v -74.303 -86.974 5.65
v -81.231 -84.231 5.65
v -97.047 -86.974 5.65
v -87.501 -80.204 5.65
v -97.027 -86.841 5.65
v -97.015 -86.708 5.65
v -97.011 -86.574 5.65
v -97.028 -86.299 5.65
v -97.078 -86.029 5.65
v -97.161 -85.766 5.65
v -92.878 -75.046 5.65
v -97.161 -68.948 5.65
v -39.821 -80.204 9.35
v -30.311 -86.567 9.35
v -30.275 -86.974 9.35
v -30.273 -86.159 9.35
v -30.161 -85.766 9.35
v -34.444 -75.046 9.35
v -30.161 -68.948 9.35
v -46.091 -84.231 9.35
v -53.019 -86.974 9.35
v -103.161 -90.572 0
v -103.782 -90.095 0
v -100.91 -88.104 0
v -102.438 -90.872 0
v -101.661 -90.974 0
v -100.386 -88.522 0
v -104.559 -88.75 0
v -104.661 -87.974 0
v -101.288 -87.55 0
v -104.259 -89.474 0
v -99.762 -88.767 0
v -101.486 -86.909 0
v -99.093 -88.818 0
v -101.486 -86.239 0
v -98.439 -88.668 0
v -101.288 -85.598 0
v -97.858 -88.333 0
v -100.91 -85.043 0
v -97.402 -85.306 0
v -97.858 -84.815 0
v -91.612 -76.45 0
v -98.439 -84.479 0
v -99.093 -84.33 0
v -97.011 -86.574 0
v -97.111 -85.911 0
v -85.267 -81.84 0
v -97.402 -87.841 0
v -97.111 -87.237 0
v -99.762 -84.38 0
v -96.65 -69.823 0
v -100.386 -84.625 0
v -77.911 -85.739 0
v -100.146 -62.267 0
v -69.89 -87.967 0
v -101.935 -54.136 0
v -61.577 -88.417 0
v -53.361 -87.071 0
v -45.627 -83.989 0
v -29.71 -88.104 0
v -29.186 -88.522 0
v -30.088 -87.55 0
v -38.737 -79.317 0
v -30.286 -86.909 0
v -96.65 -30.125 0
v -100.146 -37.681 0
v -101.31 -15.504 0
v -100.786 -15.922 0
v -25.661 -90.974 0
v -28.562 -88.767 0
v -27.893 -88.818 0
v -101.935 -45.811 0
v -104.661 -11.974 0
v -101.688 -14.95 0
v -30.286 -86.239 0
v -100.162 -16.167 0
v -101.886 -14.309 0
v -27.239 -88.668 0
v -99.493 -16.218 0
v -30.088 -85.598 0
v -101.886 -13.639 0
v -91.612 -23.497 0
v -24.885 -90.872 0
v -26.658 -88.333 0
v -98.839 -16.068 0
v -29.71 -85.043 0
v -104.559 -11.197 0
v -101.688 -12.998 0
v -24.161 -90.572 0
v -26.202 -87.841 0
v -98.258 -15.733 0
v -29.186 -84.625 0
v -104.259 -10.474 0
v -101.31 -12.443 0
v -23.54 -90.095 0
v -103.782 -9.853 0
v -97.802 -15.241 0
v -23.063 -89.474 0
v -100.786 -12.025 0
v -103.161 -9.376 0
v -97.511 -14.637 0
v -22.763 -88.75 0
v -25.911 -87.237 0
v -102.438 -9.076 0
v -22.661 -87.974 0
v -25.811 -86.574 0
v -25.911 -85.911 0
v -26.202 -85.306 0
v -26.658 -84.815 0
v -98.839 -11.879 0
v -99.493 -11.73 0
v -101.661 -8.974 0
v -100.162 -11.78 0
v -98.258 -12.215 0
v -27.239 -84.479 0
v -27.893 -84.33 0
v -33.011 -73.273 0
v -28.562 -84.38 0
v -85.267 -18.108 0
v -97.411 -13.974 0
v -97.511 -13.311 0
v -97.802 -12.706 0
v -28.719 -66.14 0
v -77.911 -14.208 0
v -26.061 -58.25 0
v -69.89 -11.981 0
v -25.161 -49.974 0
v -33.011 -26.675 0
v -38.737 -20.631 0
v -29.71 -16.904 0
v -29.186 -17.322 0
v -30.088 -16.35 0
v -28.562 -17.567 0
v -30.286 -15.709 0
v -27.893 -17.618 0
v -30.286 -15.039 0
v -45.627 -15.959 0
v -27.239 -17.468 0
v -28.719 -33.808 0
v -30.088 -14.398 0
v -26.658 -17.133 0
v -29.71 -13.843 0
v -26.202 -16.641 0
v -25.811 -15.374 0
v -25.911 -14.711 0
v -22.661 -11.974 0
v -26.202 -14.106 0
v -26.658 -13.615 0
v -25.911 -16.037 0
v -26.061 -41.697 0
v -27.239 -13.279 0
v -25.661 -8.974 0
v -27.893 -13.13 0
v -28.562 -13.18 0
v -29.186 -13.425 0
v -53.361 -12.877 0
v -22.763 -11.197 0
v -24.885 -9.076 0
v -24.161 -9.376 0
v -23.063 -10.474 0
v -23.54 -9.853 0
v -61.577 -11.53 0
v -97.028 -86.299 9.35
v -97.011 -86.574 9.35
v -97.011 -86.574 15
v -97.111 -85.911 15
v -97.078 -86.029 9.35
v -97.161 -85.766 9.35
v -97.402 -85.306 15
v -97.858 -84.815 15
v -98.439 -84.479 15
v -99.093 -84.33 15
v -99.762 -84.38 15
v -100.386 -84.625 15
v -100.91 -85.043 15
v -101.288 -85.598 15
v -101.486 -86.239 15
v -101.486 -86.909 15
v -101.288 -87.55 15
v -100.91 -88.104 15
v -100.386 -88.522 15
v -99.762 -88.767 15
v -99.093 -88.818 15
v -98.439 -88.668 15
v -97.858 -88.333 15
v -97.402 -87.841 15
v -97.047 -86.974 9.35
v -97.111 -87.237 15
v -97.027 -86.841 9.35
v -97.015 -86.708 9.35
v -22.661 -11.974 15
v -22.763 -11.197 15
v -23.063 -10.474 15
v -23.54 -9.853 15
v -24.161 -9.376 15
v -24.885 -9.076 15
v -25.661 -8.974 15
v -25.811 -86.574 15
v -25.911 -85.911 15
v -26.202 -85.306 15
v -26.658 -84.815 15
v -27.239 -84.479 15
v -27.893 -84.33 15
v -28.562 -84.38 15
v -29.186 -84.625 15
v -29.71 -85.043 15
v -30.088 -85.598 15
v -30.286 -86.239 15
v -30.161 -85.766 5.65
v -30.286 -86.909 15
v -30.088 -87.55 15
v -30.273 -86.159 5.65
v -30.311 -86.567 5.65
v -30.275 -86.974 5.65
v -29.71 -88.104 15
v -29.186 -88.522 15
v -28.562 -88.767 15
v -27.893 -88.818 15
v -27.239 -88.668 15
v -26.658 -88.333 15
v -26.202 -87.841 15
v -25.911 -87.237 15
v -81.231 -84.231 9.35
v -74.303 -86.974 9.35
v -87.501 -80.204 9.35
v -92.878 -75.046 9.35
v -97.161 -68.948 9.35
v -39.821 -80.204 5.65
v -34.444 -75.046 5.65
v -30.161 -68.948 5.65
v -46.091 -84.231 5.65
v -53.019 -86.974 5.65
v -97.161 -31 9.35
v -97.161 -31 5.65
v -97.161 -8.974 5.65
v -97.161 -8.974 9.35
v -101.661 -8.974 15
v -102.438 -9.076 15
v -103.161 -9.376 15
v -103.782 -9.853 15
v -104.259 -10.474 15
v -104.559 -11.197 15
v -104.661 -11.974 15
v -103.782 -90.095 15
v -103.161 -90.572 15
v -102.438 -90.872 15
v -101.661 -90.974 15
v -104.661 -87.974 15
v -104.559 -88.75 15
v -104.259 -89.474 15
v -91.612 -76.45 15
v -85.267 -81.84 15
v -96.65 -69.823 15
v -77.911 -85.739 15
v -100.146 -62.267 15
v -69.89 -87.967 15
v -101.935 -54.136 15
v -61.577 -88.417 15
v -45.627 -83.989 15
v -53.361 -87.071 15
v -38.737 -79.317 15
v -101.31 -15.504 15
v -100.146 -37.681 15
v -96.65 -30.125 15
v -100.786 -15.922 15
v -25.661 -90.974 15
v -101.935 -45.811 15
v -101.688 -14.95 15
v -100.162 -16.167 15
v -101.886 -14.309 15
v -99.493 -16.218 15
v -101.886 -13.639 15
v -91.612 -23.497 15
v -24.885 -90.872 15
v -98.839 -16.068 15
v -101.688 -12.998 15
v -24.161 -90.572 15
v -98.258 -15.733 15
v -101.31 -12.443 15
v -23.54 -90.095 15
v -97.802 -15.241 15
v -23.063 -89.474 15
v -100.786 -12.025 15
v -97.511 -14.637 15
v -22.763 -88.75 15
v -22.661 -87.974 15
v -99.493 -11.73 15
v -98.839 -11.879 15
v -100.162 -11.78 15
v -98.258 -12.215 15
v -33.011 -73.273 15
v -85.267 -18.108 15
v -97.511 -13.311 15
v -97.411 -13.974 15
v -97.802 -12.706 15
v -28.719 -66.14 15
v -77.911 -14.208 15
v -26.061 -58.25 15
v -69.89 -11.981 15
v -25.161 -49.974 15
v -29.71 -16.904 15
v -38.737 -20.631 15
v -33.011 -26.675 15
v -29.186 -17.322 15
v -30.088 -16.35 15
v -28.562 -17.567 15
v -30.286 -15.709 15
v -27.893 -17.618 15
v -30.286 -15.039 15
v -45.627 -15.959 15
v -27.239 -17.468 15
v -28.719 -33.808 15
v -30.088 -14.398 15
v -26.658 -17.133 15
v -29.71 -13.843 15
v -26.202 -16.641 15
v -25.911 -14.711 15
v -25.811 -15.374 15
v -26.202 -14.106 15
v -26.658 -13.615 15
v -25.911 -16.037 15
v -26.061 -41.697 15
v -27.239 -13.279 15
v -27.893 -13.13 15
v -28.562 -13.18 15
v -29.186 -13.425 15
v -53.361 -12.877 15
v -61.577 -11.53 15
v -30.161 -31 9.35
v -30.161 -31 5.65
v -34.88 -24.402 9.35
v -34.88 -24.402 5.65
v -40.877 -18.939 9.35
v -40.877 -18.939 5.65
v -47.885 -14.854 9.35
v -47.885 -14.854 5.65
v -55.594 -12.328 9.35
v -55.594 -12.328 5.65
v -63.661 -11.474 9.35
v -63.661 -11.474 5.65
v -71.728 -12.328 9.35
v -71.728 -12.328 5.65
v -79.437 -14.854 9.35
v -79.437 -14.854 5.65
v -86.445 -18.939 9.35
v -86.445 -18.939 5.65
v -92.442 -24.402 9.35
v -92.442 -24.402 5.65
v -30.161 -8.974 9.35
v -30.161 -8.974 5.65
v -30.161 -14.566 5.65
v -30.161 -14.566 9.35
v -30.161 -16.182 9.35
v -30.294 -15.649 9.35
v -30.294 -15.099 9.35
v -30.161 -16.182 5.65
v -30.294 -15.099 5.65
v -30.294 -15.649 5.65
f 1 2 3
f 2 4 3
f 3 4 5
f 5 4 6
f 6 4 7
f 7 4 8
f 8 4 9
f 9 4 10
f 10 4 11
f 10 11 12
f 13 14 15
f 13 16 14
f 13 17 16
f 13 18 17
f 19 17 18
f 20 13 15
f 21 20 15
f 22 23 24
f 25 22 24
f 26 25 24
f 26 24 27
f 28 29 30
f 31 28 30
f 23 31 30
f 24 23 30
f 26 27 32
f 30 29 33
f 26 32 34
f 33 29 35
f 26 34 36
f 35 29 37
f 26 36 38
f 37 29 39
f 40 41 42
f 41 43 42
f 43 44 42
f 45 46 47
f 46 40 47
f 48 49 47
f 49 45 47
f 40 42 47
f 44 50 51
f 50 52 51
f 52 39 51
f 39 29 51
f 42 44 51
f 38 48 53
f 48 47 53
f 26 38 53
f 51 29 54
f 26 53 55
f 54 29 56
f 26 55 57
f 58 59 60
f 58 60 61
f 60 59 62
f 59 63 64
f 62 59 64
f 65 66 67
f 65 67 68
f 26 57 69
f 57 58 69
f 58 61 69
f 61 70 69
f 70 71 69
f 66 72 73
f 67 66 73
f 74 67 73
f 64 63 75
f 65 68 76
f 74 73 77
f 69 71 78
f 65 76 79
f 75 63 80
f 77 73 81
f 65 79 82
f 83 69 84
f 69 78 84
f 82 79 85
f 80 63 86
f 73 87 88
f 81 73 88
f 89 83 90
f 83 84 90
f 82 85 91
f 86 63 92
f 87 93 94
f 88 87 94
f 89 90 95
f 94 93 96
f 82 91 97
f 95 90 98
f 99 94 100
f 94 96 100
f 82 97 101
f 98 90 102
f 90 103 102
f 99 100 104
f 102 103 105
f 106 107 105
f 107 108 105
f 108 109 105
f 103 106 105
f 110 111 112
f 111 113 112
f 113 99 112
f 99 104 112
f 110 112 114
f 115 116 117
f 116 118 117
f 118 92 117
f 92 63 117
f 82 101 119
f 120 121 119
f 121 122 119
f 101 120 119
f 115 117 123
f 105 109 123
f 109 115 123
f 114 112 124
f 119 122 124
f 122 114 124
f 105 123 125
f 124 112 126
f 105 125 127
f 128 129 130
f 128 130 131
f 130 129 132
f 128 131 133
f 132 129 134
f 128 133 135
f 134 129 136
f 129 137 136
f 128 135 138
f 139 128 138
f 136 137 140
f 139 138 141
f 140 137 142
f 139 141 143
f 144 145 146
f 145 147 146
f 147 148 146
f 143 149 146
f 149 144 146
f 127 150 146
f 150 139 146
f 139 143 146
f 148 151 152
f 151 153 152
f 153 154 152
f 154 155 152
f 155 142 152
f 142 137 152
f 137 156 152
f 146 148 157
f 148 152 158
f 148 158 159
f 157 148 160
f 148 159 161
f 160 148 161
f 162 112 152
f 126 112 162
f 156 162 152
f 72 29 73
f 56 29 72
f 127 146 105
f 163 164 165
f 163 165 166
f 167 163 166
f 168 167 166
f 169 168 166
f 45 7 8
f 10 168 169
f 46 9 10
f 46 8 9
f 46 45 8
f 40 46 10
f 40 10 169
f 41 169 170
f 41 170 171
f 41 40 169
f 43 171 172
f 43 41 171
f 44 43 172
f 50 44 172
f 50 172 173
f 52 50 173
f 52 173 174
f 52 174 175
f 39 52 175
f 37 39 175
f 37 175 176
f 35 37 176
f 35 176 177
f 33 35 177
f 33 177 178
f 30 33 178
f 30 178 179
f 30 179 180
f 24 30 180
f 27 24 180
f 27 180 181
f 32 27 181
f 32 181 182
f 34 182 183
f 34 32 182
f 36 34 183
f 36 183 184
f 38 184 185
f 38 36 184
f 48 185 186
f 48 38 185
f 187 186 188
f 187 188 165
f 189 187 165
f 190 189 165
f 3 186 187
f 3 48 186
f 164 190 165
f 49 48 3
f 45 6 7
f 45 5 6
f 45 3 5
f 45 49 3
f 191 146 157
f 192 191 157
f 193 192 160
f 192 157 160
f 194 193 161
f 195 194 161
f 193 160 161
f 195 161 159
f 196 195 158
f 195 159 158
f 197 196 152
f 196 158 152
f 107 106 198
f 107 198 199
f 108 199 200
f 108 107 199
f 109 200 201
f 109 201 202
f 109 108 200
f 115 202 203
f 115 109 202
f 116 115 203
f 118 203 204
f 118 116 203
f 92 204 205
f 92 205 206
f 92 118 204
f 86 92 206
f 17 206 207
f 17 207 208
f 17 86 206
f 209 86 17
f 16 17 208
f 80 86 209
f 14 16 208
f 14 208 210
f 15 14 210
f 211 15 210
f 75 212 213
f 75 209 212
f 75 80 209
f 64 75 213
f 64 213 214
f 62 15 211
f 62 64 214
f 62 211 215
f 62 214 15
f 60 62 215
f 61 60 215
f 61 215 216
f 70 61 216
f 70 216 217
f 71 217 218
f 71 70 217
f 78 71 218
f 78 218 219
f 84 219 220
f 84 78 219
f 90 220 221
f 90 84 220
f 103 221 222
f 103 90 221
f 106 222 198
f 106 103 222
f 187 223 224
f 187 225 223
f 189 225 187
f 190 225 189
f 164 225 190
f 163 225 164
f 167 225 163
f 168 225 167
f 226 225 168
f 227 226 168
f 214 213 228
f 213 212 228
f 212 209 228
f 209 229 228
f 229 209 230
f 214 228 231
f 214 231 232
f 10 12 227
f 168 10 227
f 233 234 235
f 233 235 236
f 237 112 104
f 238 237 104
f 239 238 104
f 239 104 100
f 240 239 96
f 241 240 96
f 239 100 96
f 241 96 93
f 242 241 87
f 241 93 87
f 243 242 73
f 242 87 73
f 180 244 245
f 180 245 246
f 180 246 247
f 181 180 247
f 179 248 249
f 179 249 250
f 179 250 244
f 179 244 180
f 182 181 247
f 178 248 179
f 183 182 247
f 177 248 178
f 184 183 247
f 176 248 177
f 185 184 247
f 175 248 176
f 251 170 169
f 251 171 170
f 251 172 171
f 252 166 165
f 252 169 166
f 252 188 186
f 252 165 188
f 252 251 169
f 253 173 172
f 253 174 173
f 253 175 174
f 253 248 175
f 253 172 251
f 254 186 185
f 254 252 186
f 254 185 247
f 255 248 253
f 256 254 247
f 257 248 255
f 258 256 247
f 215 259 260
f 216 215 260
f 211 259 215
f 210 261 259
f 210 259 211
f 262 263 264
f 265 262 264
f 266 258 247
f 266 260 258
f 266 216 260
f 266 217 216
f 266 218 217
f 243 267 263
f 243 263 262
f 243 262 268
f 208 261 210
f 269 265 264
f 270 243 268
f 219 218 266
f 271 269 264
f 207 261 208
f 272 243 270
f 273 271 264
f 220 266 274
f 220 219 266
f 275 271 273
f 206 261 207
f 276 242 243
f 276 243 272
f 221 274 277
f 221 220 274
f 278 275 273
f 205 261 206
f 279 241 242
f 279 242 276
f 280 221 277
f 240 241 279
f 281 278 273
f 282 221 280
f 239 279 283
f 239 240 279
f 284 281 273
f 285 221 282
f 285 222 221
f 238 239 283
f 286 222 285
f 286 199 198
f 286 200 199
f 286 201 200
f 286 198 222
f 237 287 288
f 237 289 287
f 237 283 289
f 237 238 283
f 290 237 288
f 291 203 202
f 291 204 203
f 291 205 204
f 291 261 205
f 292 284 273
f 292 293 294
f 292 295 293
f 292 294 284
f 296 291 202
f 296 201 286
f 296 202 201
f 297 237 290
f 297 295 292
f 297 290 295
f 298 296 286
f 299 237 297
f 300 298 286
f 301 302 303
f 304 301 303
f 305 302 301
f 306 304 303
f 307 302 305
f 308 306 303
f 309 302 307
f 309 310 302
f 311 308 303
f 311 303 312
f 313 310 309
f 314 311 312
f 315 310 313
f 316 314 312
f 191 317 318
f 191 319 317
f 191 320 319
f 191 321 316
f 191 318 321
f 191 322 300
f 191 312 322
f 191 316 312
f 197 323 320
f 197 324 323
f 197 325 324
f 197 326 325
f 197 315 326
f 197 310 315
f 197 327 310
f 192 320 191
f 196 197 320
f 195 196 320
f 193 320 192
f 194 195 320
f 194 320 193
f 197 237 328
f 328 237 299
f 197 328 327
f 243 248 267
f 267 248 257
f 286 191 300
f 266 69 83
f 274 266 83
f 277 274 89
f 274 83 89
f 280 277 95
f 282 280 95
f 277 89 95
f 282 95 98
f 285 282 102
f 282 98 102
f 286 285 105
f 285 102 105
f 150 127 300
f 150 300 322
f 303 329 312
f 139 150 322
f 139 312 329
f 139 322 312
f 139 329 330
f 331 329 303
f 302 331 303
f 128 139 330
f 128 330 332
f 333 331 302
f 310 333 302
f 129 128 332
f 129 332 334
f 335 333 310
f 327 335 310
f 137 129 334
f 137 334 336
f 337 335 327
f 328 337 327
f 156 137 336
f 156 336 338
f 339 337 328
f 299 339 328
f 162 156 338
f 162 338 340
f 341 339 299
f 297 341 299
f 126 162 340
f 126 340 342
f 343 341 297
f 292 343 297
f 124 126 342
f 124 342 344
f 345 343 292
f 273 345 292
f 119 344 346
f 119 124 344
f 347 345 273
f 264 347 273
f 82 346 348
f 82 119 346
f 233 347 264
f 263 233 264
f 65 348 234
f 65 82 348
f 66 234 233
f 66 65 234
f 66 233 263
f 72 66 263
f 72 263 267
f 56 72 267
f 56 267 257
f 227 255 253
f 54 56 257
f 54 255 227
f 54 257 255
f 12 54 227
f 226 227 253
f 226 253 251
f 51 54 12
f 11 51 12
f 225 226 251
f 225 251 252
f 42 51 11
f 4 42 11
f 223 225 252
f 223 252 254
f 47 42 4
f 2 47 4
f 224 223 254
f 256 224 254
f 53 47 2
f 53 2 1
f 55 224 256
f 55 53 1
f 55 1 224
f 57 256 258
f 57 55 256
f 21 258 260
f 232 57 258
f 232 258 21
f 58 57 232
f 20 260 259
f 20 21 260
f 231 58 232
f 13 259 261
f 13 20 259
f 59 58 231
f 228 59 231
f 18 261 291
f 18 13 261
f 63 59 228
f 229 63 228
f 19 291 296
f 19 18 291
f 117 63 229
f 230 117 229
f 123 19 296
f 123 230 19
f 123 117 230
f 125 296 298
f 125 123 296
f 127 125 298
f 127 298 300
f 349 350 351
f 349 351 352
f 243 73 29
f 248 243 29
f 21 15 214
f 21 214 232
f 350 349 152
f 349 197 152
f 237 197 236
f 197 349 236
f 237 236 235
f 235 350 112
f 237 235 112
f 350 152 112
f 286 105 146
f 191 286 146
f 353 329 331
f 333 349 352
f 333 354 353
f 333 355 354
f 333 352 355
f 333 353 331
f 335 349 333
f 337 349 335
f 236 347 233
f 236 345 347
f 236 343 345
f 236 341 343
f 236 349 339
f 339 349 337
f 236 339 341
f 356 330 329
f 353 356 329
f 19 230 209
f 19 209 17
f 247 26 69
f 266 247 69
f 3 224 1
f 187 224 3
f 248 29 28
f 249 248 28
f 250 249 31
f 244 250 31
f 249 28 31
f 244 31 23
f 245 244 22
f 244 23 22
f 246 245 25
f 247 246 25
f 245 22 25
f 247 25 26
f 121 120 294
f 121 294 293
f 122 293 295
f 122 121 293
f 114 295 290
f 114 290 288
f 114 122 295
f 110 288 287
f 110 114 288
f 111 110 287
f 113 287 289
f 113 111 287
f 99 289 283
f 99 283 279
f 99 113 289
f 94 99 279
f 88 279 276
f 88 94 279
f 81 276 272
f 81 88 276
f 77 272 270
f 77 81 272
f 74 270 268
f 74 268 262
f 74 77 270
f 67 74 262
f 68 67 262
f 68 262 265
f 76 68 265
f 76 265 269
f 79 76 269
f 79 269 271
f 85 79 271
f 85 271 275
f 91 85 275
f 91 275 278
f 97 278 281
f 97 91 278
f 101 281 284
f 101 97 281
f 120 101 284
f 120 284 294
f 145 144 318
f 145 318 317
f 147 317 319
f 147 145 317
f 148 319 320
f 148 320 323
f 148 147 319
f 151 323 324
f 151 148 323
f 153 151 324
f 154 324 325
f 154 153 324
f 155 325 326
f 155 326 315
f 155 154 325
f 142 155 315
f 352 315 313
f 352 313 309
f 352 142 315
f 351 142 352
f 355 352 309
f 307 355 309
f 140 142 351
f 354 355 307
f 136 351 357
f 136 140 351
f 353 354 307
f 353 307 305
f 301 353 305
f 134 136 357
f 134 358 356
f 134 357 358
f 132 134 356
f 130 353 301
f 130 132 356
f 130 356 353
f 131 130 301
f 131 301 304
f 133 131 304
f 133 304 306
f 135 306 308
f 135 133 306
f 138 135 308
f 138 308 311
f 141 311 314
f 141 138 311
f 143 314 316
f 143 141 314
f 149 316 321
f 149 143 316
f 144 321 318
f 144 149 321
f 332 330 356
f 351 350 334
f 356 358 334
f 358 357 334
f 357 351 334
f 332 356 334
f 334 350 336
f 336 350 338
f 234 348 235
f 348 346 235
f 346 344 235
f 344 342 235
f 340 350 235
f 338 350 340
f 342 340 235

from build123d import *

# Parameters (mm, degrees)
F0_R     = 2.25
F0_R_2   = 38.5
F1_DEPTH = 15
F2_W     = 67
F2_H     = 3.7
F3_DEPTH = 78


with BuildPart() as f1:
    # F0 (on Top) → F1 (new body)
    with BuildSketch(Plane.XY):
        with BuildLine():
            ThreePointArc((-22.661046, -11.973848), (-23.539726, -9.852527), (-25.661046, -8.973848))
            Line((-25.661046, -8.973848), (-101.661046, -8.973848))
            ThreePointArc((-101.661046, -8.973848), (-103.782367, -9.852527), (-104.661046, -11.973848))
            Line((-104.661046, -11.973848), (-104.661046, -87.973848))
            ThreePointArc((-104.661046, -87.973848), (-103.782367, -90.095168), (-101.661046, -90.973848))
            Line((-101.661046, -90.973848), (-25.661046, -90.973848))
            ThreePointArc((-25.661046, -90.973848), (-23.539726, -90.095168), (-22.661046, -87.973848))
            Line((-22.661046, -87.973848), (-22.661046, -11.973848))
        make_face()
        with Locations((-99.261046, -86.573848)):
            Circle(F0_R, mode=Mode.SUBTRACT)
        with Locations((-28.061046, -86.573848)):
            Circle(F0_R, mode=Mode.SUBTRACT)
        with Locations((-63.661046, -49.973848)):
            Circle(F0_R_2, mode=Mode.SUBTRACT)
        with Locations((-99.661046, -13.973848)):
            Circle(F0_R, mode=Mode.SUBTRACT)
        with Locations((-28.061046, -15.373848)):
            Circle(F0_R, mode=Mode.SUBTRACT)
    extrude(amount=F1_DEPTH)

    # F2 (on face) → F3 (cut)
    with BuildSketch(Plane(origin=(0, -8.973848, 0), x_dir=(-1, 0, 0), z_dir=(0, 1, 0))):
        with Locations((63.661046, 7.5)):
            Rectangle(F2_W, F2_H)
    extrude(amount=-F3_DEPTH, mode=Mode.SUBTRACT)


solid = f1.part
